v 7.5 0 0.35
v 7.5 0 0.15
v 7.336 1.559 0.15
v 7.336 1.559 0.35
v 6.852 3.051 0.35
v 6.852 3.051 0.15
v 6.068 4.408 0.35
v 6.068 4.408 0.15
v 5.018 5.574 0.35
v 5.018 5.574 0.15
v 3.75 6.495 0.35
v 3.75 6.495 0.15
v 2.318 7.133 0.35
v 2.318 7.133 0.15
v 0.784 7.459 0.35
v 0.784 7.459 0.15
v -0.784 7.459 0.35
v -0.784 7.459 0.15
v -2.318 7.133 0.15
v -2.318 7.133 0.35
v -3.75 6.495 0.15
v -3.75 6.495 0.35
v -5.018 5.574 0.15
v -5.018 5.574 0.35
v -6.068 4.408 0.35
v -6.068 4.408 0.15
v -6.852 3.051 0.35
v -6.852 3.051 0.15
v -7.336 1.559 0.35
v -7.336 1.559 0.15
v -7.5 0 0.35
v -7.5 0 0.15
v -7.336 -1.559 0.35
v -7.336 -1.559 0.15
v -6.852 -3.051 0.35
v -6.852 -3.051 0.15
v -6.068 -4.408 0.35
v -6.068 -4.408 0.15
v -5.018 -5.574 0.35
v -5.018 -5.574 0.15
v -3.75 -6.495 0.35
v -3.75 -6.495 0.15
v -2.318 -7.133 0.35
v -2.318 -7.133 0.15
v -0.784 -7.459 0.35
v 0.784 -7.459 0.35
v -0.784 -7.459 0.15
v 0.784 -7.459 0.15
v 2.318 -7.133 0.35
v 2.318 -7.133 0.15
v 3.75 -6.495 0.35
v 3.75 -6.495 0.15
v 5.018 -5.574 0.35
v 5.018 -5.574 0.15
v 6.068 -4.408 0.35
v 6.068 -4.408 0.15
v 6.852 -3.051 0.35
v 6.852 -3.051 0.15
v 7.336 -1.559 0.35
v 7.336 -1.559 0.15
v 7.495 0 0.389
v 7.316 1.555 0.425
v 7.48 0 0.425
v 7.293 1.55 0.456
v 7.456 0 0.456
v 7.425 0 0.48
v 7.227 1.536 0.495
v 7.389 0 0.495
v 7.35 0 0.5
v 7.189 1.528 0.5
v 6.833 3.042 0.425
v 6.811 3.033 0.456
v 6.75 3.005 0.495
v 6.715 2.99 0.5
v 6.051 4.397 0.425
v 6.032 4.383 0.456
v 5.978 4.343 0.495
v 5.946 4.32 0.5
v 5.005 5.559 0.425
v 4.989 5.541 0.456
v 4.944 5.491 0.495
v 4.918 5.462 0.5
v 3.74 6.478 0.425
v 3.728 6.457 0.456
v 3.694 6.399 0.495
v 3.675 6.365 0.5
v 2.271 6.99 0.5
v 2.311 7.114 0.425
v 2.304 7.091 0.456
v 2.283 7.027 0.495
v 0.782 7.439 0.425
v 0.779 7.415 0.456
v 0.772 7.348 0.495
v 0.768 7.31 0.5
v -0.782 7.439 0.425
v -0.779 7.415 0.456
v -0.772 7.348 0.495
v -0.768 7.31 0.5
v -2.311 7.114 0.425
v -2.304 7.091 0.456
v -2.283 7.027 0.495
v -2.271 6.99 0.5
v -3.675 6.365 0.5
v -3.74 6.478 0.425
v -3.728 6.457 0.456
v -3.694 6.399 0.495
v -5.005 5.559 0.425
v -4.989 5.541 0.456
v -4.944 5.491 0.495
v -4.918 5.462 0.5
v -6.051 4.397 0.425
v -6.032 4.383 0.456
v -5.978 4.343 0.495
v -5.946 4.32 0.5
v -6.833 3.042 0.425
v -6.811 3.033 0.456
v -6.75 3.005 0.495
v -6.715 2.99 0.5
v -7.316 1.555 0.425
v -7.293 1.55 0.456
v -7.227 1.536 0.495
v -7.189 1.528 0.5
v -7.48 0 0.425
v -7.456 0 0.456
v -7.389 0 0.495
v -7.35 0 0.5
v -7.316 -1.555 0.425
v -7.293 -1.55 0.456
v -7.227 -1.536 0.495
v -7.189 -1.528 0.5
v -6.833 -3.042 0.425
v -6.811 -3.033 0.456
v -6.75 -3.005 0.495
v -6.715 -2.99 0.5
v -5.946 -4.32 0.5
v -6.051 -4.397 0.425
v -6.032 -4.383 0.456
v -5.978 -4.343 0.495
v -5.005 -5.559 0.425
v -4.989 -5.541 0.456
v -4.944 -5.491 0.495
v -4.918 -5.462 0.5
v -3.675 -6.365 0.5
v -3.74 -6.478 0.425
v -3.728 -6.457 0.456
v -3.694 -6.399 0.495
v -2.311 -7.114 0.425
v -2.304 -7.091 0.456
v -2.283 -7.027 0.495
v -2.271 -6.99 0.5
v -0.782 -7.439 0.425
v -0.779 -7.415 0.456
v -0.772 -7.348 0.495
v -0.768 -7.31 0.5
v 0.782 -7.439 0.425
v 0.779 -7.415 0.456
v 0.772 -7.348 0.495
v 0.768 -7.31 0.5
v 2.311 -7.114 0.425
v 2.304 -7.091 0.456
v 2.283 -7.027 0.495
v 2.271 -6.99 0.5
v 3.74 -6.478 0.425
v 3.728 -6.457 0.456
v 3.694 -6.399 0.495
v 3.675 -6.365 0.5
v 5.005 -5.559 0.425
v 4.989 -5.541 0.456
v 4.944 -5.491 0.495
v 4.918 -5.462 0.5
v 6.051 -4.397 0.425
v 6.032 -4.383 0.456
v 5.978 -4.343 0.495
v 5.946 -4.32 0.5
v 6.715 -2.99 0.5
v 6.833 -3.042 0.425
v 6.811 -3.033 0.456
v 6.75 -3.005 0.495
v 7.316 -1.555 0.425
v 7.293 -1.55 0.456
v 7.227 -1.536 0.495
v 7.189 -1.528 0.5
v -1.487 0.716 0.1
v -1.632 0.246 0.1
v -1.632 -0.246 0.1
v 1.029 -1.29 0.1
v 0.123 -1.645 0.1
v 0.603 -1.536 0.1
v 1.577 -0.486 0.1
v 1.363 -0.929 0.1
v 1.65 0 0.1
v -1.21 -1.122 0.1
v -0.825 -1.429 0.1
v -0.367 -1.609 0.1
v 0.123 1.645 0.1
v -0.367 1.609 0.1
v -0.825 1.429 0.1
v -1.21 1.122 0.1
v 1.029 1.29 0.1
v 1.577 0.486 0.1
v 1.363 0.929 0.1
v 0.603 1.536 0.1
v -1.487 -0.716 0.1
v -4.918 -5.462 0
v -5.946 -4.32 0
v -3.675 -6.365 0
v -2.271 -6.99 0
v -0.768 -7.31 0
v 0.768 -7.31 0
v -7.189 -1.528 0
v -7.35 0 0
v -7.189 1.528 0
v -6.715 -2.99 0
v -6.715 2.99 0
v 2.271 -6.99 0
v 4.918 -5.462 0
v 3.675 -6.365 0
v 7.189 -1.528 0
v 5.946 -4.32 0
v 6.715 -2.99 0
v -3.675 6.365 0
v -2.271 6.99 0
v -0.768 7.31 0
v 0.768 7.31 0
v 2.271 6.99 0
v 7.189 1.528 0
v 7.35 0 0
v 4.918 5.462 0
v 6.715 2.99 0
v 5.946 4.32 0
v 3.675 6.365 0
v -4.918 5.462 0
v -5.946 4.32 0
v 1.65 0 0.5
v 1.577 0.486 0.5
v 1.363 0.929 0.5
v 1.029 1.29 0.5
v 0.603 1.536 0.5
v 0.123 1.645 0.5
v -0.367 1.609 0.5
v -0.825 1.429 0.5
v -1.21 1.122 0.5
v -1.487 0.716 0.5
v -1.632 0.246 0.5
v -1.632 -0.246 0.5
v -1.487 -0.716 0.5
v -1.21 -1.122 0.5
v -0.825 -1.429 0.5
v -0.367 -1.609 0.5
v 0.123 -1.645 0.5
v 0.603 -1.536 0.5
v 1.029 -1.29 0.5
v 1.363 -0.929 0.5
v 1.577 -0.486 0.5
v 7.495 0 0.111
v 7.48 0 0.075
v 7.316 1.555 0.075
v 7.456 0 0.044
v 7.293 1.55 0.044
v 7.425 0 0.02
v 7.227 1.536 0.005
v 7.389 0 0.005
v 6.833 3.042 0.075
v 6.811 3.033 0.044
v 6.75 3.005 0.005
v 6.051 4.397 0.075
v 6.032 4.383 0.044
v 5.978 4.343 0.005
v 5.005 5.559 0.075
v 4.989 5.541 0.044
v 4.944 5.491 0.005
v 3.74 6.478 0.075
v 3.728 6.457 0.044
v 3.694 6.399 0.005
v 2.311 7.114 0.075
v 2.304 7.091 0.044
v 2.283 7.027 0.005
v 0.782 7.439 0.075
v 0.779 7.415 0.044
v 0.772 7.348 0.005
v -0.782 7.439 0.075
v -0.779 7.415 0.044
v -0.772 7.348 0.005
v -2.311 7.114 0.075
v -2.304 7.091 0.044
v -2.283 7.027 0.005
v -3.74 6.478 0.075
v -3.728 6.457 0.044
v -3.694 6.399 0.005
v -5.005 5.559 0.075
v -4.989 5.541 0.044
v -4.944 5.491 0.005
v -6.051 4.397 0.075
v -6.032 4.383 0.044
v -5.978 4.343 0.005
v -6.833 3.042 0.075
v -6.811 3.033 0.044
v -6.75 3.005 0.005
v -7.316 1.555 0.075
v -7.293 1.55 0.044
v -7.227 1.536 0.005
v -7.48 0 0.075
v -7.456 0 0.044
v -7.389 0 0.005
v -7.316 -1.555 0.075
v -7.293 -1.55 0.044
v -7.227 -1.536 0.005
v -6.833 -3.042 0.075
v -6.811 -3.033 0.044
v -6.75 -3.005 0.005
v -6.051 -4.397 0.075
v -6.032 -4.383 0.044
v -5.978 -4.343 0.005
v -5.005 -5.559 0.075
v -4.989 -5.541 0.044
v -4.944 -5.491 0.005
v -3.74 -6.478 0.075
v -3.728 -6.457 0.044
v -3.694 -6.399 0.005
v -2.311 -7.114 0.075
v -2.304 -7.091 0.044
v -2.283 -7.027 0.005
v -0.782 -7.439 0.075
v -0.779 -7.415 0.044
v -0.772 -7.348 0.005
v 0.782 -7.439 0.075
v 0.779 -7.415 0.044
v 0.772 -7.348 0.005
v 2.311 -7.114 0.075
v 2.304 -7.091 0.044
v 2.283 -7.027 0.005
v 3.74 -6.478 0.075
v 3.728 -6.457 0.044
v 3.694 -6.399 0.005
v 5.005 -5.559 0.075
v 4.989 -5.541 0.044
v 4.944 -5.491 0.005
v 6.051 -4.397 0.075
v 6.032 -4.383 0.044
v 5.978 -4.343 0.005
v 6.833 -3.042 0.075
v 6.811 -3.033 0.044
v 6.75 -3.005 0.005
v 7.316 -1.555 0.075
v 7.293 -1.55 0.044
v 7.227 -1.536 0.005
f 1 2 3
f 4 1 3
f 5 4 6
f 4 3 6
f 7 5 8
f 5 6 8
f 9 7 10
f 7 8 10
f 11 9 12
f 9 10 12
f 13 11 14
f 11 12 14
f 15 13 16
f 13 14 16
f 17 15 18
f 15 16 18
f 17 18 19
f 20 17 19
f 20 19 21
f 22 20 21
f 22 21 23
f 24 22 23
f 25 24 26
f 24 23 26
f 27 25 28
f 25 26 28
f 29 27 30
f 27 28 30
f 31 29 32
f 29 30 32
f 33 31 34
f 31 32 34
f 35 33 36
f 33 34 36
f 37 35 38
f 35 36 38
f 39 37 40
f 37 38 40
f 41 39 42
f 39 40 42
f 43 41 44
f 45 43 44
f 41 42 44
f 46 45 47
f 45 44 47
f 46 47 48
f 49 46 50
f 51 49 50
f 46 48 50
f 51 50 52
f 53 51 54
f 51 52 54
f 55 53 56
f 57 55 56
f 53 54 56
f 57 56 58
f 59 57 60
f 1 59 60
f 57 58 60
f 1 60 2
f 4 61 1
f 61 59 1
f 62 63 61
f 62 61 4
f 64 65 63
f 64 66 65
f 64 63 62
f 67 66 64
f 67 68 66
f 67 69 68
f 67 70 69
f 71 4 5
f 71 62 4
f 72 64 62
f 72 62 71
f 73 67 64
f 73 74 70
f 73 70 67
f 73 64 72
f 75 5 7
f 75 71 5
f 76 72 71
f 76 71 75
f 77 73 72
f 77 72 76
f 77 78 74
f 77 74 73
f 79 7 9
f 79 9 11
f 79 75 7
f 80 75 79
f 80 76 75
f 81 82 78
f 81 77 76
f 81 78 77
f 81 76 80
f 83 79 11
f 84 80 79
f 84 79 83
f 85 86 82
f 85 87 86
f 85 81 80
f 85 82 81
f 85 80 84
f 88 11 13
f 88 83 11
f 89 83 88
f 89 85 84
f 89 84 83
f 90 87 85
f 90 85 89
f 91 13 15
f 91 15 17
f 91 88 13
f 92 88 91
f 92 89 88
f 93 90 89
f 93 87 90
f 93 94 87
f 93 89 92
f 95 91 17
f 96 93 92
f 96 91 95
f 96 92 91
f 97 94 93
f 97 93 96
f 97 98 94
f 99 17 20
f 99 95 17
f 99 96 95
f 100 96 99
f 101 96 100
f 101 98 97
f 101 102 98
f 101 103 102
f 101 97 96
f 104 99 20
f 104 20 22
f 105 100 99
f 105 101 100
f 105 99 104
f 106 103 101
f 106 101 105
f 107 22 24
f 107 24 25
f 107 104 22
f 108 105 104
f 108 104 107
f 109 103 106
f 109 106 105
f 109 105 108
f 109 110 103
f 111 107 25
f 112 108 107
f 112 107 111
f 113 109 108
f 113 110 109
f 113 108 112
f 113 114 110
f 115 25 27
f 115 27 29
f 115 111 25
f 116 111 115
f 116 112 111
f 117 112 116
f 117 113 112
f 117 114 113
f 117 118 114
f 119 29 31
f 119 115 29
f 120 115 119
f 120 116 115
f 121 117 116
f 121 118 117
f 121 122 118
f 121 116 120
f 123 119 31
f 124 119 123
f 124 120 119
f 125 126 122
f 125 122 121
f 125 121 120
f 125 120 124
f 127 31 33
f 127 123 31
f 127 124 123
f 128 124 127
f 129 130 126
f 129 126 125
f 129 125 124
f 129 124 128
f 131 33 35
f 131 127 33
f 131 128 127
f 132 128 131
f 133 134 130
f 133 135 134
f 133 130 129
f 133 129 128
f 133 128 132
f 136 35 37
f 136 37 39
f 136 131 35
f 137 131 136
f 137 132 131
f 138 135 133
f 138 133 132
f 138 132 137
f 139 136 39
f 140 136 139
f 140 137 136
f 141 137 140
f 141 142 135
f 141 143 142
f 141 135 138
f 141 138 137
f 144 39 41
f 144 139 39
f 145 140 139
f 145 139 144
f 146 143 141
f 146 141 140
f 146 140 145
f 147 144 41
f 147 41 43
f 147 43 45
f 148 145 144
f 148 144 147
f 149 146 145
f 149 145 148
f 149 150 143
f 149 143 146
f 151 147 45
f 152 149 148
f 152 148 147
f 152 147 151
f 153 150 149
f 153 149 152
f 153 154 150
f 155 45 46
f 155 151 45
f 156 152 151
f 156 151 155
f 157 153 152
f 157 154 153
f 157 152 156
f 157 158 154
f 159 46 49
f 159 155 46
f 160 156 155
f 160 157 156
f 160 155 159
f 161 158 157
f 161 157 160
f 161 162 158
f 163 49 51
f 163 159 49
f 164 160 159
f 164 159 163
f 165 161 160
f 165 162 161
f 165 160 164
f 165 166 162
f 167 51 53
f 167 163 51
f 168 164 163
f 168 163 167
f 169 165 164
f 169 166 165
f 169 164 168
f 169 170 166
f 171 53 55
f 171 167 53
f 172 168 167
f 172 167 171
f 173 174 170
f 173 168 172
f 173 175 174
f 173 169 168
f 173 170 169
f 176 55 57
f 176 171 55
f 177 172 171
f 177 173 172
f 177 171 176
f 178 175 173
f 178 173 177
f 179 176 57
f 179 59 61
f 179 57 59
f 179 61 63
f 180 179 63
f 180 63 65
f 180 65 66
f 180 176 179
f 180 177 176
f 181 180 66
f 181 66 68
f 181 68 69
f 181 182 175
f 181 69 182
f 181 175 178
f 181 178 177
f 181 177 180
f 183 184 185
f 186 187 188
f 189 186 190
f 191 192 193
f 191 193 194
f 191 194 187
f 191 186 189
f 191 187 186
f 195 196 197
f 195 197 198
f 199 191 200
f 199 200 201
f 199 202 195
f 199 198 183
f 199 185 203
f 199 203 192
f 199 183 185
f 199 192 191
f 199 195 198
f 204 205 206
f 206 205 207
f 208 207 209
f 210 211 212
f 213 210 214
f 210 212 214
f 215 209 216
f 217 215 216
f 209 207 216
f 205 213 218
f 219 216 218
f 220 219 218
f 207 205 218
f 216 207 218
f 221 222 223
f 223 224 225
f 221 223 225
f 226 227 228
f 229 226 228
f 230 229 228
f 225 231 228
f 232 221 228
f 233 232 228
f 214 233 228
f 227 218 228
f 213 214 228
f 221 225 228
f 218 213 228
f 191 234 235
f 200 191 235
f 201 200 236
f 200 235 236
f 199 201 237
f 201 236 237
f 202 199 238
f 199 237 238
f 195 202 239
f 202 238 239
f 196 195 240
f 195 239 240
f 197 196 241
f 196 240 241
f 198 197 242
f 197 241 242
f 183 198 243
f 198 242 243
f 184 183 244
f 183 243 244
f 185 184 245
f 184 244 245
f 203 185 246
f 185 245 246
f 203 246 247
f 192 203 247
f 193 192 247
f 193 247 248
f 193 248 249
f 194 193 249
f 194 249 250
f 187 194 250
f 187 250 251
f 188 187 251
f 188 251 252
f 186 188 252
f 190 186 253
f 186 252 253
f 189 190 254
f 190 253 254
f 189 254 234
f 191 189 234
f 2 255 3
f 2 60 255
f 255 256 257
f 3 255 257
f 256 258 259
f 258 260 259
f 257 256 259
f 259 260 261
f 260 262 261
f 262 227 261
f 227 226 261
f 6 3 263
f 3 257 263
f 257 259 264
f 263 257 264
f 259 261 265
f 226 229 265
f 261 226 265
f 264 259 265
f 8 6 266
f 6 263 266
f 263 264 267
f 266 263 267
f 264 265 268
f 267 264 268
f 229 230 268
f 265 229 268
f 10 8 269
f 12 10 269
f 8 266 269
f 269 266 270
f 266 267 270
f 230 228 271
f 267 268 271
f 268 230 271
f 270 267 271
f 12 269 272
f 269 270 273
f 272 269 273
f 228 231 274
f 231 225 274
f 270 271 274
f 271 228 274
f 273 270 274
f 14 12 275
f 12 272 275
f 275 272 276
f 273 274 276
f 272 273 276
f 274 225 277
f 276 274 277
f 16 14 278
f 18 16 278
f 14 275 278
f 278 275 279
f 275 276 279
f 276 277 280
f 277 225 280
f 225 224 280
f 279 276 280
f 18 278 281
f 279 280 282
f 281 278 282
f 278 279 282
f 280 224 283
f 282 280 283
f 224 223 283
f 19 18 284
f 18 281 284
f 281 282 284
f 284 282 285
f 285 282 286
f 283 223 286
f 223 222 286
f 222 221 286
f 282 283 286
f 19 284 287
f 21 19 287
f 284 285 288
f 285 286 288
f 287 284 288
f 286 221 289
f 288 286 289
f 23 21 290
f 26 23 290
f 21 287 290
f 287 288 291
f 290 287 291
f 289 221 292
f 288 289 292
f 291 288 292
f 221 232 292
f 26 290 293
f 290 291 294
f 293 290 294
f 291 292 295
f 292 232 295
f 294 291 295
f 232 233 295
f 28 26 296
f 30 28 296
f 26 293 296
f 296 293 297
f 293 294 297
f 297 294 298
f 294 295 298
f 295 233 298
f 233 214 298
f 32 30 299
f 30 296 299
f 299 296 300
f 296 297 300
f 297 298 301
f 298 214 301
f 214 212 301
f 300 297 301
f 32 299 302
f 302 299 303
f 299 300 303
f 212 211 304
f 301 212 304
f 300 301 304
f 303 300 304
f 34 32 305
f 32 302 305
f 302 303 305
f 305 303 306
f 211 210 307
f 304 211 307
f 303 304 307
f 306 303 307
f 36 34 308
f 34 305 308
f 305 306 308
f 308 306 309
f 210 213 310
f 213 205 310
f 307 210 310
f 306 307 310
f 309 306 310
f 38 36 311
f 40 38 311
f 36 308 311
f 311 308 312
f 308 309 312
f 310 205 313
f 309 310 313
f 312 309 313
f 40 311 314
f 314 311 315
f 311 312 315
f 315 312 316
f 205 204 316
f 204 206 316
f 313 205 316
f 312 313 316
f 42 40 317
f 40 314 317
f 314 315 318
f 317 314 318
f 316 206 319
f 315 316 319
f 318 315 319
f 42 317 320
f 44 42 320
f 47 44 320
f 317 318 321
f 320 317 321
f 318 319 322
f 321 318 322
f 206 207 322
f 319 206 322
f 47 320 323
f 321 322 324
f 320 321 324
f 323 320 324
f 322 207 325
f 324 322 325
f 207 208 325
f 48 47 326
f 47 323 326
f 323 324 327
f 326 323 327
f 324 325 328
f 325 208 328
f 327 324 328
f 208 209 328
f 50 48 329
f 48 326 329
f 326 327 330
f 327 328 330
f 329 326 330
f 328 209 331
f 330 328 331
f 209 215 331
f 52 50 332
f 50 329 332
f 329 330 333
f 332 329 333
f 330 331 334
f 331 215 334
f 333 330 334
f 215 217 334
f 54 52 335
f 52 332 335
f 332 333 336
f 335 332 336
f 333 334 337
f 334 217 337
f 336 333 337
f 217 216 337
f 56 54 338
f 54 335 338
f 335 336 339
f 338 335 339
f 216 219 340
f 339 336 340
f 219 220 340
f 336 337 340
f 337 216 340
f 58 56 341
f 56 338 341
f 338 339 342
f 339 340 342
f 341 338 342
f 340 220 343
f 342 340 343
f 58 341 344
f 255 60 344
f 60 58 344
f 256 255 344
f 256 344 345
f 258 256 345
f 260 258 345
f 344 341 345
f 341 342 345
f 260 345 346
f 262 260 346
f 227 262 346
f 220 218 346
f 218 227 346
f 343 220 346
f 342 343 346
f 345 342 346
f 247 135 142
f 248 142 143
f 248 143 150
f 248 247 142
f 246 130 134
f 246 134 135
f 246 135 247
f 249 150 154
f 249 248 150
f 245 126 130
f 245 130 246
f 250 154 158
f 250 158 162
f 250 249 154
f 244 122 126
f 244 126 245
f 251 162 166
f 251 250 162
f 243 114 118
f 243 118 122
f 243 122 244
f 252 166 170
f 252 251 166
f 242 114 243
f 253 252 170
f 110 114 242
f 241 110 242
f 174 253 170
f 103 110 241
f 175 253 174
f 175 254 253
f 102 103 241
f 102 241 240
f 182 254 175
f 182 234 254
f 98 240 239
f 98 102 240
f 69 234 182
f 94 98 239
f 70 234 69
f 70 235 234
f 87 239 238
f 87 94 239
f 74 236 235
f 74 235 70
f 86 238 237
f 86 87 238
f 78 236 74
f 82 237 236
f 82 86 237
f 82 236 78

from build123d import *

# Parameters (mm, degrees)
F0_R     = 7.5
F1_DEPTH = 0.5
F2_R     = 0.15
F3_R     = 1.65
F4_DEPTH = 0.4


# Not quite as in the source:
# - a feature names something its author has since deleted; it is built from what else it names


with BuildPart() as f1:
    # F0 (on Top) → F1 (new body)
    with BuildSketch(Plane.XY):
        Circle(F0_R)
    extrude(amount=F1_DEPTH)

    # F2
    f2_edges = [f1.edges().sort_by_distance(p)[0] for p in [
        (-7.5, 0, 0.5),
        (-7.5, 0, 0),
    ]]
    fillet(f2_edges, radius=F2_R)

    # F3 (on face) → F4 (cut)
    with BuildSketch(Plane.XY.offset(0.5)):
        Circle(F3_R)
    extrude(amount=-F4_DEPTH, mode=Mode.SUBTRACT)


solid = f1.part
